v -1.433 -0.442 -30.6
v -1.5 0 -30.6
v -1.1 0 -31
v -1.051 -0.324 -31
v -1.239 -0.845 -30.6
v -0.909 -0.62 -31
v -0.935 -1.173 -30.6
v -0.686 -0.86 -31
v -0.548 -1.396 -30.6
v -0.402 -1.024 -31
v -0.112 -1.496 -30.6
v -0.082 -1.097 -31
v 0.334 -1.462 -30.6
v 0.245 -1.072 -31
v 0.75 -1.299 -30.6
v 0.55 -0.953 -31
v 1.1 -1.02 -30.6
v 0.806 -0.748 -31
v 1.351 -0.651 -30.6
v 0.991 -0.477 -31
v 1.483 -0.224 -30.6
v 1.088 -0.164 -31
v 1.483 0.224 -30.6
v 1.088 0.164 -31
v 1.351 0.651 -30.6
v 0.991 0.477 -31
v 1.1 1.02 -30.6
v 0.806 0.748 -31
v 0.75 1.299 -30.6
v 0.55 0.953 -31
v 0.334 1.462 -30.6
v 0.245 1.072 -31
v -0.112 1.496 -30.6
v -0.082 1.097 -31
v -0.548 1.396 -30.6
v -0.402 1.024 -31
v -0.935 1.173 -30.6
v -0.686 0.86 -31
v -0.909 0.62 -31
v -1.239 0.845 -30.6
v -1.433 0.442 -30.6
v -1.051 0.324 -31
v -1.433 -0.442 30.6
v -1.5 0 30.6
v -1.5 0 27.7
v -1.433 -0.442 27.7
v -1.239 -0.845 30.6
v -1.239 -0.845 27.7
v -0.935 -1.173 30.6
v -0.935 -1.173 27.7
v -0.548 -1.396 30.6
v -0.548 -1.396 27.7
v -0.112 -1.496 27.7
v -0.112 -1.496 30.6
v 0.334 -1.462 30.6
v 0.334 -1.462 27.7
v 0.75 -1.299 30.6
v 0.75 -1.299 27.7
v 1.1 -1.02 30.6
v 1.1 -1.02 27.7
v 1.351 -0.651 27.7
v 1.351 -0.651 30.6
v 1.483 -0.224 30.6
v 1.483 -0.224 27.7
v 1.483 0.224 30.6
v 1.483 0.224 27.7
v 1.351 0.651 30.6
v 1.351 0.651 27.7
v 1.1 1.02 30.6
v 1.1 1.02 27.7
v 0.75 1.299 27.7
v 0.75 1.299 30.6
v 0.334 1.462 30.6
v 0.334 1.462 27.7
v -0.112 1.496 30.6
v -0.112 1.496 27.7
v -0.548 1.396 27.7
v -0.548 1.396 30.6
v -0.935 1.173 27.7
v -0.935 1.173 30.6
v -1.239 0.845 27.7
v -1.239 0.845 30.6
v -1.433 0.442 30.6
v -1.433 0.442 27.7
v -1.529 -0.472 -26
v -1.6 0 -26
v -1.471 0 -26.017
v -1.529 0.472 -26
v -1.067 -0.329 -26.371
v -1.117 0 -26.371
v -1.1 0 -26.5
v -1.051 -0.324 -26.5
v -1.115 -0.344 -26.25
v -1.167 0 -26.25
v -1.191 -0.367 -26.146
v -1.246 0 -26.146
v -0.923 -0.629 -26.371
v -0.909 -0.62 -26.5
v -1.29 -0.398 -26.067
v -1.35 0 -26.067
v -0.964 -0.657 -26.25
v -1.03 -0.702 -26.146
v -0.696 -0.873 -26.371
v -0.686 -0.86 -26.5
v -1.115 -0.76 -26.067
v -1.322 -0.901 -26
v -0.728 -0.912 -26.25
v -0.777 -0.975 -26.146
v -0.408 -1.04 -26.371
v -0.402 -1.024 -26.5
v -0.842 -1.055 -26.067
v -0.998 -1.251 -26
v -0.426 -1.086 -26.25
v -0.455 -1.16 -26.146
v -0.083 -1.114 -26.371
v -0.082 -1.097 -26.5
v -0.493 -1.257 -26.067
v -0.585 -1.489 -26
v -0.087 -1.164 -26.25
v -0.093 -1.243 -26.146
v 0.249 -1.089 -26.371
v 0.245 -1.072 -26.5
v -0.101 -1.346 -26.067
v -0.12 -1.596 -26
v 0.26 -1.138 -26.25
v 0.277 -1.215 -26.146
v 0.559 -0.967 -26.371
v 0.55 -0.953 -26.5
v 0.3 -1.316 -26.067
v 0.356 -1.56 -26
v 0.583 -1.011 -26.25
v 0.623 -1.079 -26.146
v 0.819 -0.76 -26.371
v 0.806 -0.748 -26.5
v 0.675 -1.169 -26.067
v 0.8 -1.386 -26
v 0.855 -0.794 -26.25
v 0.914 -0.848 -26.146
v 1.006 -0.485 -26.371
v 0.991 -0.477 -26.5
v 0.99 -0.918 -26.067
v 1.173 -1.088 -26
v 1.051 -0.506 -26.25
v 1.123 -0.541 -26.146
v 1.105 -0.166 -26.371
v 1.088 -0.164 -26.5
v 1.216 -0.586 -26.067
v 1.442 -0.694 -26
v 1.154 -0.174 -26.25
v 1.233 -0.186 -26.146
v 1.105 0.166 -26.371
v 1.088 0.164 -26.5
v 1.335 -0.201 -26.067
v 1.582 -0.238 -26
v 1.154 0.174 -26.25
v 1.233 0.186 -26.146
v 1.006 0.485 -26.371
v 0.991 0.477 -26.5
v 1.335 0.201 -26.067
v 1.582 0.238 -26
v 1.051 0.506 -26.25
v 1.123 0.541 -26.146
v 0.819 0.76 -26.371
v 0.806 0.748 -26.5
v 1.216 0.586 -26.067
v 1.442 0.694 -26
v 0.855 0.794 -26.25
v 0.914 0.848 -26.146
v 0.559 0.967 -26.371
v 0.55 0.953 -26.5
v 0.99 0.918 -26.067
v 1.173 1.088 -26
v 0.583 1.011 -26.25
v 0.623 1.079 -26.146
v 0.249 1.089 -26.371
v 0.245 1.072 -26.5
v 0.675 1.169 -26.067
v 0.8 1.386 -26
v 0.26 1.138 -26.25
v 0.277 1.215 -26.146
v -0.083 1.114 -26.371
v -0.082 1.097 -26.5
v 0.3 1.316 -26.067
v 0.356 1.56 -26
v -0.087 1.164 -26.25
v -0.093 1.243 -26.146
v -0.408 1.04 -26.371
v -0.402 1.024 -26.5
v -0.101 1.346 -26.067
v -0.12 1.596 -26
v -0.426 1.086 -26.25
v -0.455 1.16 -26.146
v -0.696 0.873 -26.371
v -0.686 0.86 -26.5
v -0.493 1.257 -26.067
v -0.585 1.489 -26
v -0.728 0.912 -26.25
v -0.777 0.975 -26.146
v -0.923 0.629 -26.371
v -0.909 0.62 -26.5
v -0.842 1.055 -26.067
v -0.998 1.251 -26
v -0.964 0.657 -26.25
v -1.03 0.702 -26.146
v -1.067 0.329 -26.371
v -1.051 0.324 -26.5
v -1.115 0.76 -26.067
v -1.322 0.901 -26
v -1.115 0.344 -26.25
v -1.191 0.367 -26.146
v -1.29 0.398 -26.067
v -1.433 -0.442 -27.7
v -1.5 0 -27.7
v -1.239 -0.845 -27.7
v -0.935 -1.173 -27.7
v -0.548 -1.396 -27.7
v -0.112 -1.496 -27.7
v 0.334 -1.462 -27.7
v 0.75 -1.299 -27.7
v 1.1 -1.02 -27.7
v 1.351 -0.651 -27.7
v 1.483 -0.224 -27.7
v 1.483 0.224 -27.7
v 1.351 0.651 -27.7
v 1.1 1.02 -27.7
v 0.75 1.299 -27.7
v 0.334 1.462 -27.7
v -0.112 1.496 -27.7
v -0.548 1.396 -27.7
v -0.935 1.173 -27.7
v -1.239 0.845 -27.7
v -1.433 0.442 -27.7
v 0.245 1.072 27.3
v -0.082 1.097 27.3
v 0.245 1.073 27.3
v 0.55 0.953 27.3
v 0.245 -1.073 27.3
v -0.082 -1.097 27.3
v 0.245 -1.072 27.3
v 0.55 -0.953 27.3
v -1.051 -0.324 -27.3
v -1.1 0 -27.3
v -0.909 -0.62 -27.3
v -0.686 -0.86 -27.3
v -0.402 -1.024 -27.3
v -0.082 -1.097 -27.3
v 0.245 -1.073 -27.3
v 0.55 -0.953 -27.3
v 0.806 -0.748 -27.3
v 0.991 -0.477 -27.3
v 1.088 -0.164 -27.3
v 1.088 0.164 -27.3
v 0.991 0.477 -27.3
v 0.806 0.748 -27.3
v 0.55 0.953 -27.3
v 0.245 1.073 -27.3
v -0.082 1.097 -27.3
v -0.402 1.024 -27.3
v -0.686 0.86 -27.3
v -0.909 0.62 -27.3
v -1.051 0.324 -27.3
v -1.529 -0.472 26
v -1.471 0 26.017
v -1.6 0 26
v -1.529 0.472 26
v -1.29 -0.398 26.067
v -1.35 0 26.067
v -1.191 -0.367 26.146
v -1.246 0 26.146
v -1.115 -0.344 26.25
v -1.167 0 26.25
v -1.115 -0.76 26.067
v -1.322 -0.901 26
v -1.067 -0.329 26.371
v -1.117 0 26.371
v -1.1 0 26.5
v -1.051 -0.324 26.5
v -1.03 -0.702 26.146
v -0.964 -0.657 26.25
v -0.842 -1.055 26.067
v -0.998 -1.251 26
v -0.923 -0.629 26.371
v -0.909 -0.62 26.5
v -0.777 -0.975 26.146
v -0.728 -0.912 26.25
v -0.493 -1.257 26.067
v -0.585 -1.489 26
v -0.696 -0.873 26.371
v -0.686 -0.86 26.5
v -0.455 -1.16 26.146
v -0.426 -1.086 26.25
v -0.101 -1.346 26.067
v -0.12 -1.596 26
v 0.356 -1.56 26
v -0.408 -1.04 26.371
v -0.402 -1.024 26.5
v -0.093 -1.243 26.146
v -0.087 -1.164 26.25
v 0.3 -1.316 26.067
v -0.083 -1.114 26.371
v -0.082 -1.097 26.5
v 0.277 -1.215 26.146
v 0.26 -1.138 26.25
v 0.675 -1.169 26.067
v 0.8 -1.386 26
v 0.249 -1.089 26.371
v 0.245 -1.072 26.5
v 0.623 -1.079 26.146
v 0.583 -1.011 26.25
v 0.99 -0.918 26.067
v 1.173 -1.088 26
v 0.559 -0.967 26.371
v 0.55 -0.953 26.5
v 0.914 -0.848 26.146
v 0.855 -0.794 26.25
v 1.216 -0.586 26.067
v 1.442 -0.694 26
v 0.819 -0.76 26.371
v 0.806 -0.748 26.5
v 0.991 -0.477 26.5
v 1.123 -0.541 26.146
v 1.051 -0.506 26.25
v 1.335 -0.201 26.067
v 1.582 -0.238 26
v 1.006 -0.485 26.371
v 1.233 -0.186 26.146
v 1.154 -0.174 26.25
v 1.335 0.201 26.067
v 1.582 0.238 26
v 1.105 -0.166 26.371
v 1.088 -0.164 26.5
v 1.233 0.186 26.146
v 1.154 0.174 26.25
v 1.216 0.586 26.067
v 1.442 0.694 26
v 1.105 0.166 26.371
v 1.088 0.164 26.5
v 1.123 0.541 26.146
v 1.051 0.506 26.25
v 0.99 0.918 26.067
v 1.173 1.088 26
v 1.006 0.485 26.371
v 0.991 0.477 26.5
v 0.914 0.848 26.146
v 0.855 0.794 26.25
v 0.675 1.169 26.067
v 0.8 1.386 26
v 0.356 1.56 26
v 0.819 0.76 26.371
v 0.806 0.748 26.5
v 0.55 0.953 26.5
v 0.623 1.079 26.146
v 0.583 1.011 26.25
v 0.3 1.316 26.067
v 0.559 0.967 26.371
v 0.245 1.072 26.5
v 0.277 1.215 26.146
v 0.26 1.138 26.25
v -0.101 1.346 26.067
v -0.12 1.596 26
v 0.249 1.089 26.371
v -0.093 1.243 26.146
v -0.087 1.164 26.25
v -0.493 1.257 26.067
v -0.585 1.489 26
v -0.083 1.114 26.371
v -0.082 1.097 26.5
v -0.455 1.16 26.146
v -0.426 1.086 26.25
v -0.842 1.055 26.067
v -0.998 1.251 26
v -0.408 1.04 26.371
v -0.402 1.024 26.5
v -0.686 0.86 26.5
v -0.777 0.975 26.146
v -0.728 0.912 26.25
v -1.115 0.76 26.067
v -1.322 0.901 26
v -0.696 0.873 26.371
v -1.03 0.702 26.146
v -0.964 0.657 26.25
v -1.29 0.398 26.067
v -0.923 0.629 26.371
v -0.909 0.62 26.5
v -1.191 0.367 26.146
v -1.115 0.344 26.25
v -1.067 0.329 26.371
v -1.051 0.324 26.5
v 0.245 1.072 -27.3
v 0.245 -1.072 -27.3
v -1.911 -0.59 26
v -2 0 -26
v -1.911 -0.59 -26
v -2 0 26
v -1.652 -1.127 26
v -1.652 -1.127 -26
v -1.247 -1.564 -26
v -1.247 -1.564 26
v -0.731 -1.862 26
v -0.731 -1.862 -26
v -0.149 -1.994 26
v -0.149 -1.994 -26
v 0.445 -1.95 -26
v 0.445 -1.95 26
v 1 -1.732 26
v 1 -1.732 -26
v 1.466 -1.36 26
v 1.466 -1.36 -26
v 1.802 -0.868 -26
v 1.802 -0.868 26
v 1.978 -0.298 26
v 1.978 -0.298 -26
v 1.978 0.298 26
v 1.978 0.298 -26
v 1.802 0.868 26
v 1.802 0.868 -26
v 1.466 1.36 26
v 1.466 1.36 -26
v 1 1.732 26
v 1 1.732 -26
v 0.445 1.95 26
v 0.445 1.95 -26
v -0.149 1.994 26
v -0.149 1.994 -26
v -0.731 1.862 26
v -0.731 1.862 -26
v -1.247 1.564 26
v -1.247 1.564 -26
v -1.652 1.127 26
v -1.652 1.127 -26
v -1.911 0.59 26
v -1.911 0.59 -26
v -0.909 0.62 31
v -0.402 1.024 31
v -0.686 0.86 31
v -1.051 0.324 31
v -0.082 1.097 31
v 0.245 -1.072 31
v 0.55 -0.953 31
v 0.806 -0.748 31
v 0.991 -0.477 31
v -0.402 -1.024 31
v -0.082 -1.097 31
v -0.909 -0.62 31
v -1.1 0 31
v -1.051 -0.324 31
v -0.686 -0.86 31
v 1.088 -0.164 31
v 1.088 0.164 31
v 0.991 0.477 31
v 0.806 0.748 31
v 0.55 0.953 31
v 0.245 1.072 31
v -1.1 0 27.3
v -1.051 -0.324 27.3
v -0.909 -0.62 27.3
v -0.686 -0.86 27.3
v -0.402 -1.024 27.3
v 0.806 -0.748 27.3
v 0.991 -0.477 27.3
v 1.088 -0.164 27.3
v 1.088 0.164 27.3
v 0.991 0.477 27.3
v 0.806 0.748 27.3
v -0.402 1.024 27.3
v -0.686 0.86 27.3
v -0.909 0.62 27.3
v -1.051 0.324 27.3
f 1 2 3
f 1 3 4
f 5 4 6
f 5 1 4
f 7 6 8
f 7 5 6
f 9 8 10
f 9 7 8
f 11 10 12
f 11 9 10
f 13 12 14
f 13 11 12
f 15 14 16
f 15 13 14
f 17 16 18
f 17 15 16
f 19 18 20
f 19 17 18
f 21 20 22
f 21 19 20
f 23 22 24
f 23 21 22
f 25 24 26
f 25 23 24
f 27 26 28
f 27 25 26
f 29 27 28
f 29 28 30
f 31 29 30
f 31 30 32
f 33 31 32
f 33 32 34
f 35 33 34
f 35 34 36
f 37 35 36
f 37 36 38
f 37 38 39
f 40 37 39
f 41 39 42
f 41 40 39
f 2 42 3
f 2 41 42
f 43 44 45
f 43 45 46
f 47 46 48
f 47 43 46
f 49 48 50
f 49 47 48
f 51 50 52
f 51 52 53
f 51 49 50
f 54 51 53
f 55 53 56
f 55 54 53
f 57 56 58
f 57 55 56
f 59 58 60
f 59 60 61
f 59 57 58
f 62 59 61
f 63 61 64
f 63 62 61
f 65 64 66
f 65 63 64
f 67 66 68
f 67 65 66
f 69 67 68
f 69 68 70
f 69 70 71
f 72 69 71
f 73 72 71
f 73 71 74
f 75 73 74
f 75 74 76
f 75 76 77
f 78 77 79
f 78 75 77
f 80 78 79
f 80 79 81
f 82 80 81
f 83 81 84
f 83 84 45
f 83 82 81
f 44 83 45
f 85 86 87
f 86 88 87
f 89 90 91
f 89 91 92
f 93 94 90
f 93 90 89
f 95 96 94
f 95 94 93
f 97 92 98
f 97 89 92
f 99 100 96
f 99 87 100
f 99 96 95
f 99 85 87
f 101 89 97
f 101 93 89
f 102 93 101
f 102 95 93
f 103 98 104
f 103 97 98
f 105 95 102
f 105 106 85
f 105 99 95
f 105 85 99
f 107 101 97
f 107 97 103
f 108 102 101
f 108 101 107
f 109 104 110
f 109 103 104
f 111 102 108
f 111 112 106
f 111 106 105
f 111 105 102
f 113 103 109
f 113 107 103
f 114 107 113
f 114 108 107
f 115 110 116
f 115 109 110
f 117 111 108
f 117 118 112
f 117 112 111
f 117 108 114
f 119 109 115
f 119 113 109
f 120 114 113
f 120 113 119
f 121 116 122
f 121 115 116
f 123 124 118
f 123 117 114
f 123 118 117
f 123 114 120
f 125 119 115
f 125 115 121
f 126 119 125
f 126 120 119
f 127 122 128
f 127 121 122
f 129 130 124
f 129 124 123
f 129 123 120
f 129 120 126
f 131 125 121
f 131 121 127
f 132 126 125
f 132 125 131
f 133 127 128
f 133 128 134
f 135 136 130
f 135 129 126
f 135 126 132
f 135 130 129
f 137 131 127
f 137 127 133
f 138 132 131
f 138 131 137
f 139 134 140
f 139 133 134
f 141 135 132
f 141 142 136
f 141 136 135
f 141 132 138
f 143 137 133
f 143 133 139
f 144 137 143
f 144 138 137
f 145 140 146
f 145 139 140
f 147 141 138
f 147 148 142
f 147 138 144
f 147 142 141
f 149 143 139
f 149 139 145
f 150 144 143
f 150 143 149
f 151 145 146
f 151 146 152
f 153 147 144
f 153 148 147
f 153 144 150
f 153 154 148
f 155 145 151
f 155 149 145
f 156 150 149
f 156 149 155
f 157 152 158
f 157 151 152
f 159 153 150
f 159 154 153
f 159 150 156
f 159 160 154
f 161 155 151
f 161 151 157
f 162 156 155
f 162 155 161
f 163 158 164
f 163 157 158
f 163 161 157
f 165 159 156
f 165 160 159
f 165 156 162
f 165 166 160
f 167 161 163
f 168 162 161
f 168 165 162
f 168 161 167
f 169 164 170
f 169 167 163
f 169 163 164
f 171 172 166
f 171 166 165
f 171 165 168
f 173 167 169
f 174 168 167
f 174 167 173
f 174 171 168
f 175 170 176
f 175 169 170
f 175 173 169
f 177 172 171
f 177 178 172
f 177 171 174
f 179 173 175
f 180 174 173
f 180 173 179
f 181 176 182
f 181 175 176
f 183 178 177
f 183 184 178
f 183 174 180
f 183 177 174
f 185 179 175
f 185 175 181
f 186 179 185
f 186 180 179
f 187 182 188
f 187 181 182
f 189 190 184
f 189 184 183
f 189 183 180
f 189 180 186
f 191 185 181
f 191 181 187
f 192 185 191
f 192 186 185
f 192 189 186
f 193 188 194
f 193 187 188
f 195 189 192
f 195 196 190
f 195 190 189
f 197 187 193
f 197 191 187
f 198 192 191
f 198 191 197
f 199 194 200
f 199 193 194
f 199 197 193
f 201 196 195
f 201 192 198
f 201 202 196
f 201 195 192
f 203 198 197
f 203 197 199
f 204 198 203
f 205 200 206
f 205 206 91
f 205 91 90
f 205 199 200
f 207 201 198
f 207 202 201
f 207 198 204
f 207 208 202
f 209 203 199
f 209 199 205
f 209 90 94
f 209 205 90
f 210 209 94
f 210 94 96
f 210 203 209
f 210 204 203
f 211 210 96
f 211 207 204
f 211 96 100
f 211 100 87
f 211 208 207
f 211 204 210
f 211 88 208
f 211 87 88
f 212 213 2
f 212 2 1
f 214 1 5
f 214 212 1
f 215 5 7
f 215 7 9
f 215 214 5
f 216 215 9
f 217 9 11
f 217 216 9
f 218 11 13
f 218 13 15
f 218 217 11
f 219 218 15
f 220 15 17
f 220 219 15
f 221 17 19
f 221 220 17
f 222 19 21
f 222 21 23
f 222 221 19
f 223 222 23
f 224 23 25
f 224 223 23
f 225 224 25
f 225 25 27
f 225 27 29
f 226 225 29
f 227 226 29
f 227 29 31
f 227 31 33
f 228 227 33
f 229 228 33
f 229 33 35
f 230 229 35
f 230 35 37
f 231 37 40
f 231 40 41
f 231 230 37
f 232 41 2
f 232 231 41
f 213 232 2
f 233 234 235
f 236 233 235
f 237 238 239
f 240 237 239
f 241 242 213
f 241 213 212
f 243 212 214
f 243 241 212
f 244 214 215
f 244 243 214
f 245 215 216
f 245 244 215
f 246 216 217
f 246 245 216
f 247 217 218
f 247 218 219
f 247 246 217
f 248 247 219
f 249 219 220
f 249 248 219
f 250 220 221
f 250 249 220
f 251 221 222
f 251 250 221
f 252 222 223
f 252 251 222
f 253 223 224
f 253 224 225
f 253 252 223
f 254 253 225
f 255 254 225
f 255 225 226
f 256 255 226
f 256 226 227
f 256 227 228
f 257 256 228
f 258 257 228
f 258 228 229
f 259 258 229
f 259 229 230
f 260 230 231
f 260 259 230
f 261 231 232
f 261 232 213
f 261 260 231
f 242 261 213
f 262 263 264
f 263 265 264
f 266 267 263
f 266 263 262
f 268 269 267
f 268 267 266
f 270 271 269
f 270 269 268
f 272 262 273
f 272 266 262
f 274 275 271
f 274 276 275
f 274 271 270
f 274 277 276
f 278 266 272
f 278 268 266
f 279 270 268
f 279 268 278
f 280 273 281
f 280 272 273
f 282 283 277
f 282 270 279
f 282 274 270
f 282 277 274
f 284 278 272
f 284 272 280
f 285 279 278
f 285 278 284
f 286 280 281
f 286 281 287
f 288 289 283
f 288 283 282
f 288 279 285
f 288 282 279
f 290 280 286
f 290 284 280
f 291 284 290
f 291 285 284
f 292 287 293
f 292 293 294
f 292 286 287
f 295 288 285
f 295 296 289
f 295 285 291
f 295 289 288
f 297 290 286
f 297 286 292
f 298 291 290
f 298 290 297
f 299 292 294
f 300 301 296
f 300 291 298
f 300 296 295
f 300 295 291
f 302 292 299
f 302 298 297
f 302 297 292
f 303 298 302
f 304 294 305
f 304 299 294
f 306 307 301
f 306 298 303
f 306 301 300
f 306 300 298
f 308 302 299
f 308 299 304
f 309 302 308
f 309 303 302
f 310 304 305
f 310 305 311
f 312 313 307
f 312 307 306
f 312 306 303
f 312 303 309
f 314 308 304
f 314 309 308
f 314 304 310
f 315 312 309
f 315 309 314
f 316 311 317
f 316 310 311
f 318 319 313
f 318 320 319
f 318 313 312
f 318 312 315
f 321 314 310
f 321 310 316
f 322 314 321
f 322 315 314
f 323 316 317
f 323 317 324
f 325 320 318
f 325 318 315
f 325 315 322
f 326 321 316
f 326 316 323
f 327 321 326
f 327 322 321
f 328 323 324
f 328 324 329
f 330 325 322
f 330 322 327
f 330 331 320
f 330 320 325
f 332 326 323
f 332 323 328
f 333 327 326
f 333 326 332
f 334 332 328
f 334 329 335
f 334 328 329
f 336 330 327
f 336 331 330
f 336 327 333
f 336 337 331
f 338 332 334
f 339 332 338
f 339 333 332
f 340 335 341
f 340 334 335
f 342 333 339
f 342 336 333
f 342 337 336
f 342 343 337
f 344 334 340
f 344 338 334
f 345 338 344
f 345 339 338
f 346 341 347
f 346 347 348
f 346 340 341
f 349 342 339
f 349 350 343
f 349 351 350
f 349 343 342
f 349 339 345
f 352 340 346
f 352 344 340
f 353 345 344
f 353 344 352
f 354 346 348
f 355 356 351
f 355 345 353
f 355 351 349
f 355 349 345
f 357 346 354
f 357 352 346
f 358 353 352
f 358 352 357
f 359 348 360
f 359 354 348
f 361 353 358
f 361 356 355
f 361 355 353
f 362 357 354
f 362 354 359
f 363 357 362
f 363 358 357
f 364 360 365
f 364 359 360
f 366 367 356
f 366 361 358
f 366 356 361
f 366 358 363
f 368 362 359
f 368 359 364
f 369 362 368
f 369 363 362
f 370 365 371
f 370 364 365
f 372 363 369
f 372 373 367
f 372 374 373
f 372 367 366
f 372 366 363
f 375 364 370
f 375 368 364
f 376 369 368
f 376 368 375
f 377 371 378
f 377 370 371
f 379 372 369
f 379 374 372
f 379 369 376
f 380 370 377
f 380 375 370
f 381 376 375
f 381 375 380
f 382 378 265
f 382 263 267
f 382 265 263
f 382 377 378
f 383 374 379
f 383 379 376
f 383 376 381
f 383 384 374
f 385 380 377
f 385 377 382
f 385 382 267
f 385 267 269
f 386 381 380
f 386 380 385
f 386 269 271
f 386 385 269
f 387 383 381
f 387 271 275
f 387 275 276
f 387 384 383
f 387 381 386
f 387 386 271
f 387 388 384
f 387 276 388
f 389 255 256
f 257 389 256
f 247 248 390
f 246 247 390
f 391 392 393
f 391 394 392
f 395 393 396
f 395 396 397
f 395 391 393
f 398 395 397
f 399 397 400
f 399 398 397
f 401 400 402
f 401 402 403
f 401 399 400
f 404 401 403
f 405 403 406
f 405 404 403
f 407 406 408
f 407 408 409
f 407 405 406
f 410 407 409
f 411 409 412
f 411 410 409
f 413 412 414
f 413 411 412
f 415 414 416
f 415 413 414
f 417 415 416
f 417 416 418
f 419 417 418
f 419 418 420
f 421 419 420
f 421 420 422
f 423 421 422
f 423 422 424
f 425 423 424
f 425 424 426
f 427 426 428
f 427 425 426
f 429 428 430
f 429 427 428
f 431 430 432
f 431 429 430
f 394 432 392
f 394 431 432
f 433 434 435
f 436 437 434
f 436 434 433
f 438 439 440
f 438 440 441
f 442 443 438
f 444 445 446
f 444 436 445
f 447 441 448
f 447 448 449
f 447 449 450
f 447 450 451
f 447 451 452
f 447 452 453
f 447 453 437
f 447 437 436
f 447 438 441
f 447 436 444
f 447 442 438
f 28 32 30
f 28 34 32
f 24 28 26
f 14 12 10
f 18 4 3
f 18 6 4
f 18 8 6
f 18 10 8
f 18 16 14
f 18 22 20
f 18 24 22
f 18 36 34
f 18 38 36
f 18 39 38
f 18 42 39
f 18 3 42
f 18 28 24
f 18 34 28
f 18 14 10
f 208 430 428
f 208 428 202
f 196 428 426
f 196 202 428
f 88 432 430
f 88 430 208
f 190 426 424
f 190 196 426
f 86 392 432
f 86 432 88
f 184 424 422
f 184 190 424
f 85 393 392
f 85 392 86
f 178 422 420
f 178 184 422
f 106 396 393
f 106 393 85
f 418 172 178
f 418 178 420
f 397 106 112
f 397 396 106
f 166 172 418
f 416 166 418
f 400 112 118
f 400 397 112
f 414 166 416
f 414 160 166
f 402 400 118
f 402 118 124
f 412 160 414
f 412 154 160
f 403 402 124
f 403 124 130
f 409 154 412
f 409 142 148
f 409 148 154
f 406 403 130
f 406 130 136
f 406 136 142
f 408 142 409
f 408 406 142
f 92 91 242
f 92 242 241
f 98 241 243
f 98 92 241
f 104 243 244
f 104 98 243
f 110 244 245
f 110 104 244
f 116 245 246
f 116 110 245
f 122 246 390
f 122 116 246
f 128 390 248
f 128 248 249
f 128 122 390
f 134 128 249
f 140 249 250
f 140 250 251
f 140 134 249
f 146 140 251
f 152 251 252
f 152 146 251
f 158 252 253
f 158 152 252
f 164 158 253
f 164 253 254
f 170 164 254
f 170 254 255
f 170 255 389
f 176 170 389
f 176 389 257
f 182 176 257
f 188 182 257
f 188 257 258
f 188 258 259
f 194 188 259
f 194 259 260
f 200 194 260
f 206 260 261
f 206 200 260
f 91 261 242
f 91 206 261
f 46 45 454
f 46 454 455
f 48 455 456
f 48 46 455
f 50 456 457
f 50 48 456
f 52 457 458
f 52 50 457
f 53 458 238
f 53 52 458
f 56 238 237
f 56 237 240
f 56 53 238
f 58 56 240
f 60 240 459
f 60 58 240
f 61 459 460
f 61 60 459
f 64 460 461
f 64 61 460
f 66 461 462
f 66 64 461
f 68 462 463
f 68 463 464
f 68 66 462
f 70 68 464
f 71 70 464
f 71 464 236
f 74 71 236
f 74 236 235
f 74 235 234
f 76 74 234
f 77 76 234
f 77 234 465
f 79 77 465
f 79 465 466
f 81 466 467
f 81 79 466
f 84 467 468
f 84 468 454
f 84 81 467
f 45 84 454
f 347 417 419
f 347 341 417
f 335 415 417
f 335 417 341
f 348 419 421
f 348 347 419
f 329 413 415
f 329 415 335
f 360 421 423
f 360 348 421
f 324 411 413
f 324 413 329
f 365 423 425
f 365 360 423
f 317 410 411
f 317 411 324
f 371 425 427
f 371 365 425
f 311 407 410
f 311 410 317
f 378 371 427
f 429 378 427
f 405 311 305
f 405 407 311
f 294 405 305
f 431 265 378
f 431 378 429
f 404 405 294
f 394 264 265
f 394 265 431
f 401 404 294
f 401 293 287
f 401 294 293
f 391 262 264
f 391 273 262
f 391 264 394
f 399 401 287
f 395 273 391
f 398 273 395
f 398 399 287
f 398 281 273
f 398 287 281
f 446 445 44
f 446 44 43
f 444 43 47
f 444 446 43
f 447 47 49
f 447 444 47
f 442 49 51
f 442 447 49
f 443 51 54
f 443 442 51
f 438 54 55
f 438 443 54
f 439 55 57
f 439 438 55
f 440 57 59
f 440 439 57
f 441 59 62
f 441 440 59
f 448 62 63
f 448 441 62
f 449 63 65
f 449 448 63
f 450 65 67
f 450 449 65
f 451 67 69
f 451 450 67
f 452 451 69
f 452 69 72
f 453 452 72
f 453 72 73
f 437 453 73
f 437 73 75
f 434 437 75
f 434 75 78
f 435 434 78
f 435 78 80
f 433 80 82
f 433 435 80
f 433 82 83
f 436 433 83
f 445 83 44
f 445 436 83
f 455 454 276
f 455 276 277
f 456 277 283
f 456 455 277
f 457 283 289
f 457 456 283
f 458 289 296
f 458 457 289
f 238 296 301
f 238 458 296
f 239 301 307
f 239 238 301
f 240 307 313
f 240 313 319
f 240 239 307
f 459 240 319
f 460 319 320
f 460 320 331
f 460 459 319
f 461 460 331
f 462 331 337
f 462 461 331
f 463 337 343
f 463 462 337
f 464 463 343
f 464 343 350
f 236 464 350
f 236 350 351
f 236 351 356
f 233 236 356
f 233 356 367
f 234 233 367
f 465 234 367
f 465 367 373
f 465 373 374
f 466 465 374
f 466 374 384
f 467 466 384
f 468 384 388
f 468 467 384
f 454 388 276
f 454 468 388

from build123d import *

# Parameters (mm, degrees)
CHAMFER_1_SIZE = 0.4
CHAMFER_2_SIZE = 0.4
FILLET_1_R     = 0.5


with BuildPart() as part:
    # Эскиз1 → Повернуть1 (revolve)
    with BuildSketch(Plane(origin=(0, 0, 0), x_dir=(1, 0, 0), z_dir=(0, 1, 0))):
        Polygon((0, 31), (-1.5, 31), (-1.5, 27.3), (-1.1, 27.3), (-1.1, 26), (-2, 26), (-2, -26), (-1.1, -26), (-1.1, -27.3), (-1.5, -27.3), (-1.5, -31), (0, -31), align=None)
    revolve(axis=Axis((0, 0, -31), (0, 0, 1)))

    # Фаска1
    chamfer_1_edges = [part.edges().sort_by_distance(p)[0] for p in [
        (1.5, 0, -31),
        (1.5, 0, 31),
    ]]
    chamfer(chamfer_1_edges, length=CHAMFER_1_SIZE)

    # Фаска2
    chamfer_2_edges = [part.edges().sort_by_distance(p)[0] for p in [
        (1.5, 0, -27.3),
        (1.5, 0, 27.3),
    ]]
    chamfer(chamfer_2_edges, length=CHAMFER_2_SIZE - 0.0001)  # a hair under: the kernel refuses the full size

    # Скругление1
    fillet_1_edges = [part.edges().sort_by_distance(p)[0] for p in [
        (1.1, 0, -26),
        (1.1, 0, 26),
    ]]
    fillet(fillet_1_edges, radius=FILLET_1_R)


solid = part.part
